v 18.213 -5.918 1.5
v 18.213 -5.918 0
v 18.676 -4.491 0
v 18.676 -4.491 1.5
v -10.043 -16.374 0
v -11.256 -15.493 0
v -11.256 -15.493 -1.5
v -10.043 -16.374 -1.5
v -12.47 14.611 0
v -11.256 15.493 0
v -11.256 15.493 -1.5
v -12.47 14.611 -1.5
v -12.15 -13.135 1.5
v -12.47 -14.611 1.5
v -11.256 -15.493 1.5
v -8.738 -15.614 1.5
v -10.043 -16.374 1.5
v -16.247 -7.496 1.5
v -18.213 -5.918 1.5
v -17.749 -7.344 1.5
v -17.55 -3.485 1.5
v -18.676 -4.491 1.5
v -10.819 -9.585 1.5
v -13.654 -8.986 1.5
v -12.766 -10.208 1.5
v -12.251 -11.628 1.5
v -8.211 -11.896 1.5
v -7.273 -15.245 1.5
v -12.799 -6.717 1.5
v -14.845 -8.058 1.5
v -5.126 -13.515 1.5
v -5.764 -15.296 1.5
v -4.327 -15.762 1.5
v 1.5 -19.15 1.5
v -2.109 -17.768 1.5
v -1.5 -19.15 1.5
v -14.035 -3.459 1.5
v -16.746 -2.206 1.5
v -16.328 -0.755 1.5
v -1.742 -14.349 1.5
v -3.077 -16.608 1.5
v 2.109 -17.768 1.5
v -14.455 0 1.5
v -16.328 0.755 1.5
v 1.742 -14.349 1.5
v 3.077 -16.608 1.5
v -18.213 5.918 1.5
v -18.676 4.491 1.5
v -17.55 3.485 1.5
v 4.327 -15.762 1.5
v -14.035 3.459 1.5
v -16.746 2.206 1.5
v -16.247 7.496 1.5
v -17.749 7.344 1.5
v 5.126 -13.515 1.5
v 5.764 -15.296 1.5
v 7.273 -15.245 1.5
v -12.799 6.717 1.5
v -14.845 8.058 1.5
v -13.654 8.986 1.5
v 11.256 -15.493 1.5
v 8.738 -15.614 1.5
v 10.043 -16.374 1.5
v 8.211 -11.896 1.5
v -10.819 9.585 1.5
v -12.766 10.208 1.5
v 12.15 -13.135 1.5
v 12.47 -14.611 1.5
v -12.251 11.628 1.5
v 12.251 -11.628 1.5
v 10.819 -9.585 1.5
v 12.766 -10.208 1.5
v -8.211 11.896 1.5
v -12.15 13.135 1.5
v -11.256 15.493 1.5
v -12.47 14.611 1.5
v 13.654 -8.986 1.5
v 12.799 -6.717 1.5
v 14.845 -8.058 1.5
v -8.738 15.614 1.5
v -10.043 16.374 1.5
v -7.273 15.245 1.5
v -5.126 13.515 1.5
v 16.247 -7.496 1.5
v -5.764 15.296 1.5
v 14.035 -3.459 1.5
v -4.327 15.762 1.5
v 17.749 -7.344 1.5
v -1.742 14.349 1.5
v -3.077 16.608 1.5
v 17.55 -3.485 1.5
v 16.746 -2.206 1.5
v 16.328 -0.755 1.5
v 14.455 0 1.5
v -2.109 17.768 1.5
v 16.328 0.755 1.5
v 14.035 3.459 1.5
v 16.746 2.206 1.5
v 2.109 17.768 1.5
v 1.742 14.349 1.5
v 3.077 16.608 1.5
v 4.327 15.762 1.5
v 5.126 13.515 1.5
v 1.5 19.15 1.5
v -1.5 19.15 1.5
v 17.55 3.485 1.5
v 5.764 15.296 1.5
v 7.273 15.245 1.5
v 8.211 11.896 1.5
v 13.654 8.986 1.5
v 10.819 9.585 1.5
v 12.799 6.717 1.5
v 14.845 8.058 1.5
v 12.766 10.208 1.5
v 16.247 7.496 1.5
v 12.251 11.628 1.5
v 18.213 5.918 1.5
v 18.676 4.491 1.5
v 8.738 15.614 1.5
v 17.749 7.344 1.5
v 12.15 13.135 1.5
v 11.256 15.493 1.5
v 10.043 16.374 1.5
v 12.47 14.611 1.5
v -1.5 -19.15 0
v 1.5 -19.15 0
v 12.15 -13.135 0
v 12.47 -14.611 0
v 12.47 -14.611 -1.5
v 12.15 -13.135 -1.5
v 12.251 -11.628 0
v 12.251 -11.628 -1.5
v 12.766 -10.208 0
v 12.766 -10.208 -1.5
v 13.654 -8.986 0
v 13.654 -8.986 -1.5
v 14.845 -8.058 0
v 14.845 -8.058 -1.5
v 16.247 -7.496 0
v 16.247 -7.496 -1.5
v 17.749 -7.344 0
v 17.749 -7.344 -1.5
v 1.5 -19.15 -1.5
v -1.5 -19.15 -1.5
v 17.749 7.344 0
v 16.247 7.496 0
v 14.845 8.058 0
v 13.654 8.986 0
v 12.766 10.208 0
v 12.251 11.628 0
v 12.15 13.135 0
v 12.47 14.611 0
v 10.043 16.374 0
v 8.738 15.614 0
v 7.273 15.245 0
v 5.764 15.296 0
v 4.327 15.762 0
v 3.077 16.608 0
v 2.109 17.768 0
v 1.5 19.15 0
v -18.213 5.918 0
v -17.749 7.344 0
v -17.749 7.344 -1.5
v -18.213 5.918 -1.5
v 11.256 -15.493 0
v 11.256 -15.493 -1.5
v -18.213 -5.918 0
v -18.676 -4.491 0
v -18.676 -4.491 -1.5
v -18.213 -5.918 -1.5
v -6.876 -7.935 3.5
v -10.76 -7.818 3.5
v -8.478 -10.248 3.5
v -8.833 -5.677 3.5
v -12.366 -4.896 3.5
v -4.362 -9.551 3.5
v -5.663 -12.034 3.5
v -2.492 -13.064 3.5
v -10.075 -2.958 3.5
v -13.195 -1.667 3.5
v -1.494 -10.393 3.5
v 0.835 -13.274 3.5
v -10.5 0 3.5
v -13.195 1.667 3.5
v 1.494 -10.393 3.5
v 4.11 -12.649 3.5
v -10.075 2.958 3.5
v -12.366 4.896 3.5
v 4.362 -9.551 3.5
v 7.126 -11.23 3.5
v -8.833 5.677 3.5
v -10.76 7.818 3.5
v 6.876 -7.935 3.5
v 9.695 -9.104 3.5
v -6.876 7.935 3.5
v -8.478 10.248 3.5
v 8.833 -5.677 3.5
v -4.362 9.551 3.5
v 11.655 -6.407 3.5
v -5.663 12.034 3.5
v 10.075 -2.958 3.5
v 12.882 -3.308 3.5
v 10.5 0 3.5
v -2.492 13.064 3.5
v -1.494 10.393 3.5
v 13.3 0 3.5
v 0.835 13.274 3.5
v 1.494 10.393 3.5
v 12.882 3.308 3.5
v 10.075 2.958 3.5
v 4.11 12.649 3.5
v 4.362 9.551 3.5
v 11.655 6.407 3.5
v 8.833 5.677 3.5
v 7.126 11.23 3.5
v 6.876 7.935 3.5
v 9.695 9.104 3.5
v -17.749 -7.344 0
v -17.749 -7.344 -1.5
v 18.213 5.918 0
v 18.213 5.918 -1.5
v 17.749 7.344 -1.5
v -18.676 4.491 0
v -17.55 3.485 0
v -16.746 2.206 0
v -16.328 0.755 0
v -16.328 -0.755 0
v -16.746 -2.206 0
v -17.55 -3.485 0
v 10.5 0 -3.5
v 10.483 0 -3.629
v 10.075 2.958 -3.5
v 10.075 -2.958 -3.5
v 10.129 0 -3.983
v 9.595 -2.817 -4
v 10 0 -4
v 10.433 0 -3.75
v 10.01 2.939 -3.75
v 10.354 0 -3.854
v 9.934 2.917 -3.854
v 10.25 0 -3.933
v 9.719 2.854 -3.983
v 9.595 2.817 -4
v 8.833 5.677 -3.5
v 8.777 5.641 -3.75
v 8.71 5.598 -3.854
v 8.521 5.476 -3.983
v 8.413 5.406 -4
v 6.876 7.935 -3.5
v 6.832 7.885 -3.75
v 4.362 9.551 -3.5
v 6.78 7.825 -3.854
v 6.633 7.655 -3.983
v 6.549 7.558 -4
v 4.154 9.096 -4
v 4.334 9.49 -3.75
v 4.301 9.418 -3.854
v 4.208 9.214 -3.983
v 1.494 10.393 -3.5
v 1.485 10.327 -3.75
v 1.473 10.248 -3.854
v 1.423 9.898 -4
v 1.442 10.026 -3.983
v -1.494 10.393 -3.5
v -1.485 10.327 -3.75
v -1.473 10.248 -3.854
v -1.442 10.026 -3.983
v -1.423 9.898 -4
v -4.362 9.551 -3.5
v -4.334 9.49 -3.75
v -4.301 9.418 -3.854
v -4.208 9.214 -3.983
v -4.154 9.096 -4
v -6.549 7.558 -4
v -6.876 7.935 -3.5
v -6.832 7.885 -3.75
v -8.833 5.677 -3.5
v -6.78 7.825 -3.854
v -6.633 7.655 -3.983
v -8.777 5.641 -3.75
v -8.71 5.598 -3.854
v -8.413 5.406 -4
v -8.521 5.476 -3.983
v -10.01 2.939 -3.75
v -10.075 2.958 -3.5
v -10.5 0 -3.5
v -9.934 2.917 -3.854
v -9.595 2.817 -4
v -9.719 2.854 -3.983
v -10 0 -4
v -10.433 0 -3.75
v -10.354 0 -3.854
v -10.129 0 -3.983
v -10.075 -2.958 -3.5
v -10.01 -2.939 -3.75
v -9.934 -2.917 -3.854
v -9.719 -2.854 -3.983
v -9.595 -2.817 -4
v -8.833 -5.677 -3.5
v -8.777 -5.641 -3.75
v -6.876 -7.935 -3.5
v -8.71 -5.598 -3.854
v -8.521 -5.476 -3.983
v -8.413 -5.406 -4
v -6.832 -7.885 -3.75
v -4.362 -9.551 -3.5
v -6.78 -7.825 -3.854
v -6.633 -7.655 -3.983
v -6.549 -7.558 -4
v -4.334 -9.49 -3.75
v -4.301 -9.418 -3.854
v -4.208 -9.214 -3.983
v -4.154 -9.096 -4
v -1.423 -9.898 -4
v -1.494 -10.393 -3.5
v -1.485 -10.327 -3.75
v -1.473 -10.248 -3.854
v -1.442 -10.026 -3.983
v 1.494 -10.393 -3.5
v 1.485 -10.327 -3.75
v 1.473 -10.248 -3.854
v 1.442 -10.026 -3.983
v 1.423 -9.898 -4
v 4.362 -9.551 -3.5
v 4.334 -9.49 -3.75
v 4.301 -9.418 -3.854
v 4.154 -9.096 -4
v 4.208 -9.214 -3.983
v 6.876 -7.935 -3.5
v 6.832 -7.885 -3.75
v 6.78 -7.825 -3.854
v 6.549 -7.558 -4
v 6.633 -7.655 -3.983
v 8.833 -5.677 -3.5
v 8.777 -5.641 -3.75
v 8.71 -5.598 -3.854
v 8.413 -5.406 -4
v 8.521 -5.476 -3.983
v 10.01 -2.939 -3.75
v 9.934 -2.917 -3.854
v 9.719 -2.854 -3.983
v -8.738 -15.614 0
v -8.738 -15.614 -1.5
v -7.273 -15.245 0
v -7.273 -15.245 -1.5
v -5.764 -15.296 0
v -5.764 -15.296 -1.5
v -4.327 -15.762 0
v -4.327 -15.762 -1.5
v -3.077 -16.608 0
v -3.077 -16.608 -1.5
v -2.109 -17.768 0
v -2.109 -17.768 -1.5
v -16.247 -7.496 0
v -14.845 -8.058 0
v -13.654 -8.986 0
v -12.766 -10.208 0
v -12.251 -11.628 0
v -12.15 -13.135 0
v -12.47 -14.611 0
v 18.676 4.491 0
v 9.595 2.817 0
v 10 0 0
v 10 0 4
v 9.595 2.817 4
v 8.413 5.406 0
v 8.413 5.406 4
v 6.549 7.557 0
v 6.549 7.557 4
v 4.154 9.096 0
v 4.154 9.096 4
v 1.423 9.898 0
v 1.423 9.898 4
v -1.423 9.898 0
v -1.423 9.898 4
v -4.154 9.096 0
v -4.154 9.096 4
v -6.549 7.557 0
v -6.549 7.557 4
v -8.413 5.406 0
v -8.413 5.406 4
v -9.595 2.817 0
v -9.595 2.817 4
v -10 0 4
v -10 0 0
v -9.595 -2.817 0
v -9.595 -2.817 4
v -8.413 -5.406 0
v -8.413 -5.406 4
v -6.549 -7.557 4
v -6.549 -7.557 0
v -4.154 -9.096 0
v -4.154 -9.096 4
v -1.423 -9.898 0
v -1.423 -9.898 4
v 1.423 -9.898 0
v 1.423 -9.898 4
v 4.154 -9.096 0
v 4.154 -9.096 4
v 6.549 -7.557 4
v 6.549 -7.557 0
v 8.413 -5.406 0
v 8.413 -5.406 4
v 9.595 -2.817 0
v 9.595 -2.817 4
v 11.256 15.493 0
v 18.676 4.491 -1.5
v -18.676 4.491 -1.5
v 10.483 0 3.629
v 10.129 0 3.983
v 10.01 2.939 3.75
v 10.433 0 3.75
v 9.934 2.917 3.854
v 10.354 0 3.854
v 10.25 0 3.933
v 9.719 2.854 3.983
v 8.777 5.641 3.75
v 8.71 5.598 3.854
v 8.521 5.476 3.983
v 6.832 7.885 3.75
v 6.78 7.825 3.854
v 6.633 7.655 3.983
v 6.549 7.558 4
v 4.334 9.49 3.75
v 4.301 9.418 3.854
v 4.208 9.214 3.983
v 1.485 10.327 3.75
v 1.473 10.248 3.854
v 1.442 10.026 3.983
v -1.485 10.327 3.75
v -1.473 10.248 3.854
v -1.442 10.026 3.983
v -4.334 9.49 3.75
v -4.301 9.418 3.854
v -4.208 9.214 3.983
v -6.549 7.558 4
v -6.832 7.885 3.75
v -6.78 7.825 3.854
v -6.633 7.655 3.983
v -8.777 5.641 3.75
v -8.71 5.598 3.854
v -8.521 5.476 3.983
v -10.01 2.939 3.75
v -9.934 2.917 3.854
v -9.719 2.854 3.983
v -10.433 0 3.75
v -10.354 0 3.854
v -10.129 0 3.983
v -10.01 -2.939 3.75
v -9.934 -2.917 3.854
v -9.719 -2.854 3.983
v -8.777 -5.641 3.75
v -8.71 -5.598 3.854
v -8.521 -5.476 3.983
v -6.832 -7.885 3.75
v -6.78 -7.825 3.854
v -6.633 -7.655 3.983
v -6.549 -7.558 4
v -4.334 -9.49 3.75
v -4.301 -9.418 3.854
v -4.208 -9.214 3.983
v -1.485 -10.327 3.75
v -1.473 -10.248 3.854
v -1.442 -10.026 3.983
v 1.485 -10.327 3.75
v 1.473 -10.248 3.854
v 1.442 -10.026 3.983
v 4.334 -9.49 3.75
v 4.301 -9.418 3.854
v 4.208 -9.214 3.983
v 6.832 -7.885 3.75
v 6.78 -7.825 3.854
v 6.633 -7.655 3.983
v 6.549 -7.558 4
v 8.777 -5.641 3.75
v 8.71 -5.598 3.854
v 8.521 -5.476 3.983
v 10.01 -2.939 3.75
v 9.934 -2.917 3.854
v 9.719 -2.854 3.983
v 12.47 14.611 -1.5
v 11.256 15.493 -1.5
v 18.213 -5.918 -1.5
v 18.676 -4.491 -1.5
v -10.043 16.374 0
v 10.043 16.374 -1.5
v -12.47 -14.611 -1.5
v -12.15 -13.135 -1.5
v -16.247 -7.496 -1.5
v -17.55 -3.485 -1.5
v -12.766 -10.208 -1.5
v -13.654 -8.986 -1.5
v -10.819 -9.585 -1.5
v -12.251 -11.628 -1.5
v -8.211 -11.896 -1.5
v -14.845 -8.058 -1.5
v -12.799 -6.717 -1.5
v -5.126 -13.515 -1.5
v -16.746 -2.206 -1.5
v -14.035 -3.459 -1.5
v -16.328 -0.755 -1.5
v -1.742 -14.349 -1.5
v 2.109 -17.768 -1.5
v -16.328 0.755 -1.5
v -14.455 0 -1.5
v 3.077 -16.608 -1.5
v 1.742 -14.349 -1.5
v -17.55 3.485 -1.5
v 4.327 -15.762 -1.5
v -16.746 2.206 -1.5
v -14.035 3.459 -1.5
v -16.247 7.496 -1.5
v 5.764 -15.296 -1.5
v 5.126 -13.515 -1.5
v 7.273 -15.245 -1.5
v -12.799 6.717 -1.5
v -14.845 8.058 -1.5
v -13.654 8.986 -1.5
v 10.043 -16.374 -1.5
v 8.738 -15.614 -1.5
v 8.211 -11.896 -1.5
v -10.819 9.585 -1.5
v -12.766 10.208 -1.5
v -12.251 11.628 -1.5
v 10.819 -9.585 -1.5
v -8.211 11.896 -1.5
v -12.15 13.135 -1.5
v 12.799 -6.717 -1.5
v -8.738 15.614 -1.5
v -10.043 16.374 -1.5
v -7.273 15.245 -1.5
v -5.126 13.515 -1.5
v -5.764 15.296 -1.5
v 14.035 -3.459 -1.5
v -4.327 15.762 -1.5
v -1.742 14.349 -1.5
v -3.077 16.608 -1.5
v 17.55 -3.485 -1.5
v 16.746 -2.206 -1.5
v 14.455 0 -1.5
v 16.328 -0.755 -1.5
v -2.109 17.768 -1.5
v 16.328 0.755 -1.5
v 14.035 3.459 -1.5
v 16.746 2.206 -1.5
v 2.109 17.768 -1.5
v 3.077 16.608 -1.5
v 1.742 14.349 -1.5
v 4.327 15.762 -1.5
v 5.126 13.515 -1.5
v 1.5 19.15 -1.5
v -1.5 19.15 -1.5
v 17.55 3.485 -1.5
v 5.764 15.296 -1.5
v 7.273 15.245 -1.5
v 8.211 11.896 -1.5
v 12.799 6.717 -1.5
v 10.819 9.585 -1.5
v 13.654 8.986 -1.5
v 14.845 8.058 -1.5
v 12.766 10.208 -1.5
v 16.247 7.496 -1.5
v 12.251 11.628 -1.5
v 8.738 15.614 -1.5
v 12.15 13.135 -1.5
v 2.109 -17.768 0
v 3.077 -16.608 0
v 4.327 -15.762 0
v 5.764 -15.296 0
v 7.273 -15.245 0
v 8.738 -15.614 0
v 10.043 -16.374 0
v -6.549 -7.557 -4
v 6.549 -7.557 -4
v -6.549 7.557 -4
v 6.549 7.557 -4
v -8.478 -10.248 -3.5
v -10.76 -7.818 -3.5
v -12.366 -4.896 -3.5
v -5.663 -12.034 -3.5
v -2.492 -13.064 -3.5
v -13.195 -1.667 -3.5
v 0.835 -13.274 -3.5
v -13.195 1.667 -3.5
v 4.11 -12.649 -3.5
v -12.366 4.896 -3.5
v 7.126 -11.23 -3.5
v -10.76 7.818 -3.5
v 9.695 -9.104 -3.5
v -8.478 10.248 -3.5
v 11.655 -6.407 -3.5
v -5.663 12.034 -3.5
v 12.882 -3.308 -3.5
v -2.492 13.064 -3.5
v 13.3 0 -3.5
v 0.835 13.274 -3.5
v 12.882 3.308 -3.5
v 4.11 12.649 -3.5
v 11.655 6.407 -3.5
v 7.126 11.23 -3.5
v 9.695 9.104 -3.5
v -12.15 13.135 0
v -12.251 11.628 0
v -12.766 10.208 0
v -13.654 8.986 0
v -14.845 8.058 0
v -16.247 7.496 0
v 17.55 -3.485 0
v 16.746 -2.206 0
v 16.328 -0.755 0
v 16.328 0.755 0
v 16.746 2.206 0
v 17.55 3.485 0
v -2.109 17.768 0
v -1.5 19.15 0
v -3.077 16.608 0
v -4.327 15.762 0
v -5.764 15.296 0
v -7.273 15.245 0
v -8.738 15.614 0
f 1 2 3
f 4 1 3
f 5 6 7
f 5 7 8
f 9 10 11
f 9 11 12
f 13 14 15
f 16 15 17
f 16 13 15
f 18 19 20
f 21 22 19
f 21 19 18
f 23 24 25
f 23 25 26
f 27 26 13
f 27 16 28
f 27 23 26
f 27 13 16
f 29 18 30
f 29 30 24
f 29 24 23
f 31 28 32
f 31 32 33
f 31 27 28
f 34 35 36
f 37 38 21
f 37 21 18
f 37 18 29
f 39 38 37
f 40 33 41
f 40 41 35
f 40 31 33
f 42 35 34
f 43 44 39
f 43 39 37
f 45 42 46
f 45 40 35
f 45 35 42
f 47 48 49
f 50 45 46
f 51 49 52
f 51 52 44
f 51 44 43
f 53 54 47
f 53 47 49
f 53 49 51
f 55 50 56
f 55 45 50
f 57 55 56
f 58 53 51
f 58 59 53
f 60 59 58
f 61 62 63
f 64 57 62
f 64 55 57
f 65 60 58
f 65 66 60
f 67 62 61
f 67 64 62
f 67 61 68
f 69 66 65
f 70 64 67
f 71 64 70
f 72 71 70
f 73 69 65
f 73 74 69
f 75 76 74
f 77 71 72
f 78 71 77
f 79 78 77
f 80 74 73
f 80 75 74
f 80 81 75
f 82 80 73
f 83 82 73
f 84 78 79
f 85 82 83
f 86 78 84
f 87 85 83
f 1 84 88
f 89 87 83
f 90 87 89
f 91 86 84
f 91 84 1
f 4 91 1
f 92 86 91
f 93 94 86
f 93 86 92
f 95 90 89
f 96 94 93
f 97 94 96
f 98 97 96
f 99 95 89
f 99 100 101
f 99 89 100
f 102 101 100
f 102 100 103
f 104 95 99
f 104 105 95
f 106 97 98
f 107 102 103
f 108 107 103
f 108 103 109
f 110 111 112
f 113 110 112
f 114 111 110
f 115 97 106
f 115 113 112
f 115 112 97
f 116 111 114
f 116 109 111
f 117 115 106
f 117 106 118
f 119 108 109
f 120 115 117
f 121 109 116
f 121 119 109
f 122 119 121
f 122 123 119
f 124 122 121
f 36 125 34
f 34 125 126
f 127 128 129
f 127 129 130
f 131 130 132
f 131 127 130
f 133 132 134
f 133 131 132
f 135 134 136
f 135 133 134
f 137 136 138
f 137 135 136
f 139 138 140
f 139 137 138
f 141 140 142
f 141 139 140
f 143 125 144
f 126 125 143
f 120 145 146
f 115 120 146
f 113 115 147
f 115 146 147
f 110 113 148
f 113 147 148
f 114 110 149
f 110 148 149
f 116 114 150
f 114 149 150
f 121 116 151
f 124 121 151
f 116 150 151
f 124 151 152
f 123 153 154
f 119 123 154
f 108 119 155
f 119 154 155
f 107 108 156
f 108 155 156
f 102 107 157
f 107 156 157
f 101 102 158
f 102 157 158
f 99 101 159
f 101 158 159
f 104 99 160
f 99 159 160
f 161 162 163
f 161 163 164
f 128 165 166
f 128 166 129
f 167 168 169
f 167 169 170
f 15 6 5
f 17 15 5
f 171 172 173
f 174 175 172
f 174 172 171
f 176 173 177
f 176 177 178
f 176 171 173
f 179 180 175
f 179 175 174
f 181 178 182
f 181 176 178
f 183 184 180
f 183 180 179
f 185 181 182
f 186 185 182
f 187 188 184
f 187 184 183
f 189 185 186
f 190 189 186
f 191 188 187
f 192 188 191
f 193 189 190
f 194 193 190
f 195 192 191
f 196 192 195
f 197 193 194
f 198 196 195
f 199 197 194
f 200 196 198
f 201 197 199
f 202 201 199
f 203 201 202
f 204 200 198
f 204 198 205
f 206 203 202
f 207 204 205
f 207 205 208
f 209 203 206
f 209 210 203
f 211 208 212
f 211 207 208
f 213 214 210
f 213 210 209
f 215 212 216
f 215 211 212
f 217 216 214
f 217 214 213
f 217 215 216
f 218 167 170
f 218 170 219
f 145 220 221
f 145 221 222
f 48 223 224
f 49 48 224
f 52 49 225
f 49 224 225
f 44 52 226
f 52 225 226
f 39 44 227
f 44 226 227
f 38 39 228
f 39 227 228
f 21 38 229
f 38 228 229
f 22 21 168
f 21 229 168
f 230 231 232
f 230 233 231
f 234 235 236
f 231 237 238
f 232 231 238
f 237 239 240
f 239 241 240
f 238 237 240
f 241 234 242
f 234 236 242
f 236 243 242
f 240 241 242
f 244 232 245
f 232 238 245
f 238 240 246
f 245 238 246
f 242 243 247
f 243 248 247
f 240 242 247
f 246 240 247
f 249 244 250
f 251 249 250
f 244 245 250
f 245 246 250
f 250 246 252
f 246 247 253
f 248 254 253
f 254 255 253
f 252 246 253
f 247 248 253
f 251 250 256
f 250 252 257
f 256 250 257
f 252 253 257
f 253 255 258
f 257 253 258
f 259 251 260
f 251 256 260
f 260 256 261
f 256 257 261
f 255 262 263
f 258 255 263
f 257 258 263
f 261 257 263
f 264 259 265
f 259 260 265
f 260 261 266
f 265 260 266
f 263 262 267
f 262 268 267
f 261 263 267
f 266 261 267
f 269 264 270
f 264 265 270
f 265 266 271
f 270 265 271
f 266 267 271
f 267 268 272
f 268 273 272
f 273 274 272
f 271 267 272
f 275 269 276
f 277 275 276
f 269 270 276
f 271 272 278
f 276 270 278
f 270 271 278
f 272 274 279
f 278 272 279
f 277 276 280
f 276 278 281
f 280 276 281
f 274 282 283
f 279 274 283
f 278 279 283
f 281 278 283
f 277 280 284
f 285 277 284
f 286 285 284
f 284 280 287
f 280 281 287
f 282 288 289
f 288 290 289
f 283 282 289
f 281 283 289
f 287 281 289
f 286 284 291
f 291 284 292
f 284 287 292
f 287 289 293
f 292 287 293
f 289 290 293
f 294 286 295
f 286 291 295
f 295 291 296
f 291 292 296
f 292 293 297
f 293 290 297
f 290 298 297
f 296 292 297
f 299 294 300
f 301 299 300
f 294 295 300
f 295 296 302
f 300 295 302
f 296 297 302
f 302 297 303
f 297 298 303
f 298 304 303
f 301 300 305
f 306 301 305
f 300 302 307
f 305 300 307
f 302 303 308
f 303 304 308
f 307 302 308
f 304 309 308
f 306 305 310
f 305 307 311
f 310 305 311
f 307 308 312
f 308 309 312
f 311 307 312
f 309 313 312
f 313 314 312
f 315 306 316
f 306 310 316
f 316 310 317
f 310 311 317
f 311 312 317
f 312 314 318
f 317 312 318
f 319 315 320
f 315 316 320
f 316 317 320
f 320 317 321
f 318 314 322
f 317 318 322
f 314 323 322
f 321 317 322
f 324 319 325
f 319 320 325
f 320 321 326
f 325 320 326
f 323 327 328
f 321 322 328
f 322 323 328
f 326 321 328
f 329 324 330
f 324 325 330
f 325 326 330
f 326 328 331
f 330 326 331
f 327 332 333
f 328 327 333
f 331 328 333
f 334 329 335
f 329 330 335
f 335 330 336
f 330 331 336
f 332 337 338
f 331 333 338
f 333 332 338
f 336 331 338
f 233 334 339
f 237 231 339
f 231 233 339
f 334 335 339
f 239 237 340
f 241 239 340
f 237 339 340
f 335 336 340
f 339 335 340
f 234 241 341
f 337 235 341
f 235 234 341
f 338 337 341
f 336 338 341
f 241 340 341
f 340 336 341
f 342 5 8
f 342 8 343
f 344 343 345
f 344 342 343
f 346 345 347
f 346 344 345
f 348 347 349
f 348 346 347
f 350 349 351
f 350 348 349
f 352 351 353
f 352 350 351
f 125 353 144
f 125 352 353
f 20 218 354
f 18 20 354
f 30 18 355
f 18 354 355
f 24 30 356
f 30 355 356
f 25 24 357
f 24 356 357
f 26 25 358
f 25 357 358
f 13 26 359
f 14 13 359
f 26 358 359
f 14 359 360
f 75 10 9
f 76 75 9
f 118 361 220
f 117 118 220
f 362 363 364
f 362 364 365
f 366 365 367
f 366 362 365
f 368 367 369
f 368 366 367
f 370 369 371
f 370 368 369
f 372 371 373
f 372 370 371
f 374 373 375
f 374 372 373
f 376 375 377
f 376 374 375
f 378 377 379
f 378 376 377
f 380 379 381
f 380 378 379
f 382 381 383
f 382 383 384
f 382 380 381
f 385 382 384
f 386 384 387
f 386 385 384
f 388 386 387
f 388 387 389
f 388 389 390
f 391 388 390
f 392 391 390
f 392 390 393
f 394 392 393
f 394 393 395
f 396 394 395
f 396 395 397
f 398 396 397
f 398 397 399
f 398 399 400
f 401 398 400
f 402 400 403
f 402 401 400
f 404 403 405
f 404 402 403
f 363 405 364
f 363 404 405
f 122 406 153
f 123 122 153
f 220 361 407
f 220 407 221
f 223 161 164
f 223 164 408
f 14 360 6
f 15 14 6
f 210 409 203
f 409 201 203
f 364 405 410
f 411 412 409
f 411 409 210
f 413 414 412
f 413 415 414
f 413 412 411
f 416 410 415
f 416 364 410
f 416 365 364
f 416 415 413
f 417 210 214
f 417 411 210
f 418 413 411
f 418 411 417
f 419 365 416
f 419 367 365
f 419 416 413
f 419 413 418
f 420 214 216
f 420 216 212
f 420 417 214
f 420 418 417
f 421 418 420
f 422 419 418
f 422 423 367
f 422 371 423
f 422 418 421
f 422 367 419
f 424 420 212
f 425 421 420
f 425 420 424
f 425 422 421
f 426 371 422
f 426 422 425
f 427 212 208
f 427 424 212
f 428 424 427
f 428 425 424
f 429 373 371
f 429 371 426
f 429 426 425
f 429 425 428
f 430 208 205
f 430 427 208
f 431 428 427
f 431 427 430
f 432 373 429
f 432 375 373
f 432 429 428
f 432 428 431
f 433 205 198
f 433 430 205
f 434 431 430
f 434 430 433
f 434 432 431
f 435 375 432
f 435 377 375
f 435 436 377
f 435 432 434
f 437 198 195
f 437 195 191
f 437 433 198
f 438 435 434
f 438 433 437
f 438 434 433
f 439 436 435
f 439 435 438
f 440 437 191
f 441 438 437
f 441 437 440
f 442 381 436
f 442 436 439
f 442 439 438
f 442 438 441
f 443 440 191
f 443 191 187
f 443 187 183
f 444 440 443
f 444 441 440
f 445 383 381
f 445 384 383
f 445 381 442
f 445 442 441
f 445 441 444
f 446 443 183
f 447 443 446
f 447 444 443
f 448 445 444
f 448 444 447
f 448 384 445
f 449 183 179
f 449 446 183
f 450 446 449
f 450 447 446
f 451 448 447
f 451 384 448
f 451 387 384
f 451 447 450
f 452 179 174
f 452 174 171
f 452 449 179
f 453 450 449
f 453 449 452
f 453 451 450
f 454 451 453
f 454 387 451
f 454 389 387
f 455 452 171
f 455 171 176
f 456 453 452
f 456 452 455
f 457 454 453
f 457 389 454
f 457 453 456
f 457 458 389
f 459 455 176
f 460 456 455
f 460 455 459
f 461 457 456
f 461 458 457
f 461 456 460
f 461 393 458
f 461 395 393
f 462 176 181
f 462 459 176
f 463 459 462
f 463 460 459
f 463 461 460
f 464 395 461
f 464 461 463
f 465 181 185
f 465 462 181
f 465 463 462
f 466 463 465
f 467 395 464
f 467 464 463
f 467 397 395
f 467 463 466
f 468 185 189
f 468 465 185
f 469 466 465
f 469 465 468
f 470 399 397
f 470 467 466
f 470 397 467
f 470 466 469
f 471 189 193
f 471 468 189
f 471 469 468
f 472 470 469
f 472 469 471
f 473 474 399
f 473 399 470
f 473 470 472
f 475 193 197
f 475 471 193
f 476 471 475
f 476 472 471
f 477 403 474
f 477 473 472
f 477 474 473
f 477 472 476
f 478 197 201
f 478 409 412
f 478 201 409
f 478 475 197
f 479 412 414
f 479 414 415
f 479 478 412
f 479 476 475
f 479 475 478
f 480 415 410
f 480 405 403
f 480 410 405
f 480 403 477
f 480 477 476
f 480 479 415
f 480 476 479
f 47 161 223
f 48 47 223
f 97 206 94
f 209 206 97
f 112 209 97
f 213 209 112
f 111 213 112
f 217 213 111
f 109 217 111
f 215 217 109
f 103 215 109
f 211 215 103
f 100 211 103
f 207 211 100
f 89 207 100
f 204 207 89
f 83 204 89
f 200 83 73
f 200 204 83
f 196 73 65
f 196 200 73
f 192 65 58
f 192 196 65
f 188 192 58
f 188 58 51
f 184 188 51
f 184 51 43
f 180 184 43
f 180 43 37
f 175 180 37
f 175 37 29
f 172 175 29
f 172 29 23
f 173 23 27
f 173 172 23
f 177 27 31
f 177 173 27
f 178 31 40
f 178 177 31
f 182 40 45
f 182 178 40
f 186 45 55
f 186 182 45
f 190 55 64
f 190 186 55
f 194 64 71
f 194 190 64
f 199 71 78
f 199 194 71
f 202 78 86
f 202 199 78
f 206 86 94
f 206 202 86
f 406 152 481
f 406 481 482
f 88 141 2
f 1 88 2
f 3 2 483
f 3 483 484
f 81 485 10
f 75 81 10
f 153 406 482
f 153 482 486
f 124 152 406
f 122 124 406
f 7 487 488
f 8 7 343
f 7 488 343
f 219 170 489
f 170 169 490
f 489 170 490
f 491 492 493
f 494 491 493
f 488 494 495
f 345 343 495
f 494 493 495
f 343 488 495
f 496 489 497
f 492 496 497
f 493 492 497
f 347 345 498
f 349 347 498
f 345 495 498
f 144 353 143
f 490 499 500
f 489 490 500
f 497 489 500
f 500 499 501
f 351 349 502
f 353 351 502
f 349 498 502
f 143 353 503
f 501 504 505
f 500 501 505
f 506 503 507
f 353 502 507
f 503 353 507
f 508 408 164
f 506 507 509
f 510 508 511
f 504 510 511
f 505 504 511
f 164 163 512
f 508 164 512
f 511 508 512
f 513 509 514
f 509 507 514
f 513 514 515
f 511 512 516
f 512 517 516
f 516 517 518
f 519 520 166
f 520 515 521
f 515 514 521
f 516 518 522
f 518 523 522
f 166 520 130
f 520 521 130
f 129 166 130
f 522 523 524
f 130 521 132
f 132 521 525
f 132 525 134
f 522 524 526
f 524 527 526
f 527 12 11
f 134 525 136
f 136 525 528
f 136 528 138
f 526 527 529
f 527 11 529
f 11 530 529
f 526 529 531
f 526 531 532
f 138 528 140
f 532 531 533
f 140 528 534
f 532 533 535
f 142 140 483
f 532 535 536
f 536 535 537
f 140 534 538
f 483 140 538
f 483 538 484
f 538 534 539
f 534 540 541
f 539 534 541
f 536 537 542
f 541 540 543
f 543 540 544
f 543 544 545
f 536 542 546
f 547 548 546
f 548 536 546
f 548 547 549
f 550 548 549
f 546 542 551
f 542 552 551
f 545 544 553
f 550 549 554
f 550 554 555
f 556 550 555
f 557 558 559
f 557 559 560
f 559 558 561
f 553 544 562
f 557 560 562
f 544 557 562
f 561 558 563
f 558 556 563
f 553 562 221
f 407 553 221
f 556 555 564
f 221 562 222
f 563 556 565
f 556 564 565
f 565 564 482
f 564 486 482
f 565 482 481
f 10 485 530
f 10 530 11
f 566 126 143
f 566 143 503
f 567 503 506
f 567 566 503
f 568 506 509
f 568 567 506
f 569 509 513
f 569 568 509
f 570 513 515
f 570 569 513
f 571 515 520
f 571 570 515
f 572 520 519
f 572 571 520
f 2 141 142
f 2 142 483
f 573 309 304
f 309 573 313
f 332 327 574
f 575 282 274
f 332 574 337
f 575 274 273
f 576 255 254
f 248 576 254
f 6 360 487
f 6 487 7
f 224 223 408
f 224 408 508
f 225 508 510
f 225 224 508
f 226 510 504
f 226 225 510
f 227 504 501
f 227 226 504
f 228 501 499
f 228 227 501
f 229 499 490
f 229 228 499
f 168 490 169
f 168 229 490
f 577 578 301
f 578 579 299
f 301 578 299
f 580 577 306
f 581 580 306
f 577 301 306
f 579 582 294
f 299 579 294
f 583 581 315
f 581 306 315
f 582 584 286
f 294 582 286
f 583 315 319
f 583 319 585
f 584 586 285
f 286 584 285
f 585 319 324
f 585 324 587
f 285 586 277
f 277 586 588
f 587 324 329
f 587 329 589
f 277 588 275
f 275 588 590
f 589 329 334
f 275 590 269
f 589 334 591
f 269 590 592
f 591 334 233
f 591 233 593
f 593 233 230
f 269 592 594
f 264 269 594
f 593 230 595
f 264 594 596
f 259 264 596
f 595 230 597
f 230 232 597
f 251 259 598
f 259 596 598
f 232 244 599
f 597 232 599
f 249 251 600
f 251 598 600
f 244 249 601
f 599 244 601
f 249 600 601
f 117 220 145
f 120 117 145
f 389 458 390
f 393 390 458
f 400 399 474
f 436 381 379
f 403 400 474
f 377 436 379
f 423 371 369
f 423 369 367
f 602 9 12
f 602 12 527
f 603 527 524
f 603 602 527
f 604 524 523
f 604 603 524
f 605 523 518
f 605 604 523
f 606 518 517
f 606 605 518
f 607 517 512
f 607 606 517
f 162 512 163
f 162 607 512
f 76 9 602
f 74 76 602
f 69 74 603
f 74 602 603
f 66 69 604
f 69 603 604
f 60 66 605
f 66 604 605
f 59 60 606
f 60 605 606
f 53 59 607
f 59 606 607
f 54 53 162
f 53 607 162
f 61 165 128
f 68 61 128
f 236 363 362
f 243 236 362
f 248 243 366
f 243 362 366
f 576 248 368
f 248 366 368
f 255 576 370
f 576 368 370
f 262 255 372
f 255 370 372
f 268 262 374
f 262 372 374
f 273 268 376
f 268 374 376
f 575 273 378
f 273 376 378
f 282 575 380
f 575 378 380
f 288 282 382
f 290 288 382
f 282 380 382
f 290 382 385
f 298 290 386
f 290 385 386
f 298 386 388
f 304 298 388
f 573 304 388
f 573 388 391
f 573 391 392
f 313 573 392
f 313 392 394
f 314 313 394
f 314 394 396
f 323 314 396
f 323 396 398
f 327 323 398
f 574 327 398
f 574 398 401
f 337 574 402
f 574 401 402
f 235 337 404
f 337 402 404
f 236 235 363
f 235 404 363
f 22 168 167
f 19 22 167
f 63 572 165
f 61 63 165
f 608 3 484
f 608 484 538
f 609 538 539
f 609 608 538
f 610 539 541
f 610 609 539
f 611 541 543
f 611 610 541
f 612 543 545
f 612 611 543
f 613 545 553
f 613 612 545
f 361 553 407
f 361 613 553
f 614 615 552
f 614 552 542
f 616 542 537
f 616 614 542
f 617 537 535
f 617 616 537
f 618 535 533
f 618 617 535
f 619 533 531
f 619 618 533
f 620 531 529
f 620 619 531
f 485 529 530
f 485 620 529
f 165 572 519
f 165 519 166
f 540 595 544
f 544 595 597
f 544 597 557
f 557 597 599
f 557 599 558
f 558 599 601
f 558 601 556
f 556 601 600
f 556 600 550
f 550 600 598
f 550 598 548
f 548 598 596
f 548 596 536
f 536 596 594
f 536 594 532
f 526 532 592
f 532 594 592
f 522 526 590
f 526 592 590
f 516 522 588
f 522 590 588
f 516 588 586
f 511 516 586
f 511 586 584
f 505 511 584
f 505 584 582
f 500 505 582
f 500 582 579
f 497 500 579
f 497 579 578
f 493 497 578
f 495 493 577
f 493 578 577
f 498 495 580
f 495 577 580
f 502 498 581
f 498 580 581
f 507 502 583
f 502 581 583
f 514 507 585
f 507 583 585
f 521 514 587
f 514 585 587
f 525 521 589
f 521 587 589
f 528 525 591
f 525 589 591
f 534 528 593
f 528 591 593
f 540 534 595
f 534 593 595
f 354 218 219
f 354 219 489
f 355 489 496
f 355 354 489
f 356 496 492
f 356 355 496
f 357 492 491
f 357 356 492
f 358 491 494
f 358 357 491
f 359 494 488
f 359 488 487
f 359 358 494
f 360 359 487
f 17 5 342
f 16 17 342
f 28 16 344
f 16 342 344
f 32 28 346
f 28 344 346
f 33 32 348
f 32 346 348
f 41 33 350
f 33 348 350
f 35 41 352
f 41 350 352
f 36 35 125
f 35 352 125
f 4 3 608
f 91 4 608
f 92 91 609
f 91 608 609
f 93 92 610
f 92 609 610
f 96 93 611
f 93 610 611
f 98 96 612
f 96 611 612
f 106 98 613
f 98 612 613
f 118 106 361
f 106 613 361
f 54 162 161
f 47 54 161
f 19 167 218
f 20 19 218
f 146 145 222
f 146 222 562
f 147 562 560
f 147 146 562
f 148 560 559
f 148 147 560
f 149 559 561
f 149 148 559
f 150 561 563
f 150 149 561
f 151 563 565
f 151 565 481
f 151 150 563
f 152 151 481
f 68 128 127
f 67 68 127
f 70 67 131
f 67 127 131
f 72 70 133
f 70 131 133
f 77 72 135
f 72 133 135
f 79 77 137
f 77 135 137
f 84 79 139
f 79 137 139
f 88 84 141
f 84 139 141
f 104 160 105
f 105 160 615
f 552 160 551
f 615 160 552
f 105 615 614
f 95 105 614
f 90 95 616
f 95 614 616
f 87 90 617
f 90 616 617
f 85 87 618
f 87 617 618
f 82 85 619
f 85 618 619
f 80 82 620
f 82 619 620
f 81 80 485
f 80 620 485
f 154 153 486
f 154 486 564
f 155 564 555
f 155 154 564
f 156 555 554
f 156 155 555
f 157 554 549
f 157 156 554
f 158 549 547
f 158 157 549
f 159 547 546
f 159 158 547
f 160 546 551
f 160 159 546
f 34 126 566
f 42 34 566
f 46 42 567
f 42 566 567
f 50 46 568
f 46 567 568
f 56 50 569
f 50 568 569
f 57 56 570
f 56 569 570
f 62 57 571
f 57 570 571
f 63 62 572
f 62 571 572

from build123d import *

# Parameters (mm, degrees)
F0_R     = 14.5
F1_DEPTH = 1.5
F0_R_2   = 10.5
F2_DEPTH = 3.5
F0_R_3   = 10
F3_DEPTH = 4
F5_R     = 0.49999


# Not quite as in the source:
# - a fillet or chamfer that OpenCascade refuses, or shapes differently, is made with other operations: its cross-section is extruded or revolved along the edge and cut away or added
# - a fillet or chamfer is up to 0.001 mm smaller than in the source, because OpenCascade refuses the exact size


with BuildPart() as f1:
    # F0 (on Top) → F1 (new body)
    with BuildSketch(Plane.XY):
        with BuildLine():
            Line((-17.7492067955, 7.3442602167), (-18.2127322871, 5.9176754423))
            Line((-18.2127322871, 5.9176754423), (-18.6762577786, 4.4910906678))
            ThreePointArc((-18.6762577786, 4.4910906678), (-16.275, 0), (-18.6762577786, -4.4910906678))
            Line((-18.6762577786, -4.4910906678), (-18.2127322871, -5.9176754423))
            Line((-18.2127322871, -5.9176754423), (-17.7492067955, -7.3442602167))
            ThreePointArc((-17.7492067955, -7.3442602167), (-13.1667515835, -9.5662049811), (-12.469613073, -14.6109975638))
            Line((-12.469613073, -14.6109975638), (-11.2560875814, -15.4926754423))
            Line((-11.2560875814, -15.4926754423), (-10.0425620898, -16.3743533207))
            ThreePointArc((-10.0425620898, -16.3743533207), (-5.0292515835, -15.4784448027), (-1.5, -19.15))
            Line((-1.5, -19.15), (0, -19.15))
            Line((0, -19.15), (1.5, -19.15))
            ThreePointArc((1.5, -19.15), (5.0292515835, -15.4784448027), (10.0425620898, -16.3743533207))
            Line((10.0425620898, -16.3743533207), (11.2560875814, -15.4926754423))
            Line((11.2560875814, -15.4926754423), (12.469613073, -14.6109975638))
            ThreePointArc((12.469613073, -14.6109975638), (13.1667515835, -9.5662049811), (17.7492067955, -7.3442602167))
            Line((17.7492067955, -7.3442602167), (18.2127322871, -5.9176754423))
            Line((18.2127322871, -5.9176754423), (18.6762577786, -4.4910906678))
            ThreePointArc((18.6762577786, -4.4910906678), (16.275, 0), (18.6762577786, 4.4910906678))
            Line((18.6762577786, 4.4910906678), (18.2127322871, 5.9176754423))
            Line((18.2127322871, 5.9176754423), (17.7492067955, 7.3442602167))
            ThreePointArc((17.7492067955, 7.3442602167), (13.1667515835, 9.5662049811), (12.469613073, 14.6109975638))
            Line((12.469613073, 14.6109975638), (11.2560875814, 15.4926754423))
            Line((11.2560875814, 15.4926754423), (10.0425620898, 16.3743533207))
            ThreePointArc((10.0425620898, 16.3743533207), (5.0292515835, 15.4784448027), (1.5, 19.15))
            Line((1.5, 19.15), (0, 19.15))
            Line((0, 19.15), (-1.5, 19.15))
            ThreePointArc((-1.5, 19.15), (-5.0292515835, 15.4784448027), (-10.0425620898, 16.3743533207))
            Line((-10.0425620898, 16.3743533207), (-11.2560875814, 15.4926754423))
            Line((-11.2560875814, 15.4926754423), (-12.469613073, 14.6109975638))
            ThreePointArc((-12.469613073, 14.6109975638), (-13.1667515835, 9.5662049811), (-17.7492067955, 7.3442602167))
        make_face()
        Circle(F0_R, mode=Mode.SUBTRACT)
    extrude(amount=F1_DEPTH)

    # F0 (on Top) → F2 (join)
    with BuildSketch(Plane.XY):
        Circle(F0_R)
        Circle(F0_R_2, mode=Mode.SUBTRACT)
    extrude(amount=F2_DEPTH)

    # F0 (on Top) → F3 (join)
    with BuildSketch(Plane.XY):
        Circle(F0_R_2)
        Circle(F0_R_3, mode=Mode.SUBTRACT)
    extrude(amount=F3_DEPTH)

    # F4: chamfer of 1.2 x 2.0784609691 on 1 edges, made by hand


with BuildPart() as f4_tool2:
    # F4_s3 → F4_t4 (revolve)
    with BuildSketch(Plane.XZ):
        Polygon((14.5, 1.4215390309), (13.3, 3.5), (14.5, 3.5), align=None)
    revolve(axis=Axis((0, 0, 3.5), (0, 0, 1)))

    split(bisect_by=Plane.XY.offset(1.5), keep=Keep.TOP)


with BuildPart() as f1_1:
    add(f1.part)

    # F4_t1: cut F4_tool2
    add(f4_tool2.part, mode=Mode.SUBTRACT)

    # F5 (radius 0.5 in the source; OpenCascade refuses exactly that, so slightly less here)
    f5_edges = [f1_1.edges().sort_by_distance(p)[0] for p in [
        (-10.5, 0, 4),
    ]]
    fillet(f5_edges, radius=F5_R)

    # F6: F1 across face


with BuildPart() as f1_2:
    add(f1_1.part)
    add(f1_1.part.mirror(Plane(origin=(0, 0, 0), x_dir=(1, 0, 0), z_dir=(0, 0, -1))))


solid = f1_2.part
